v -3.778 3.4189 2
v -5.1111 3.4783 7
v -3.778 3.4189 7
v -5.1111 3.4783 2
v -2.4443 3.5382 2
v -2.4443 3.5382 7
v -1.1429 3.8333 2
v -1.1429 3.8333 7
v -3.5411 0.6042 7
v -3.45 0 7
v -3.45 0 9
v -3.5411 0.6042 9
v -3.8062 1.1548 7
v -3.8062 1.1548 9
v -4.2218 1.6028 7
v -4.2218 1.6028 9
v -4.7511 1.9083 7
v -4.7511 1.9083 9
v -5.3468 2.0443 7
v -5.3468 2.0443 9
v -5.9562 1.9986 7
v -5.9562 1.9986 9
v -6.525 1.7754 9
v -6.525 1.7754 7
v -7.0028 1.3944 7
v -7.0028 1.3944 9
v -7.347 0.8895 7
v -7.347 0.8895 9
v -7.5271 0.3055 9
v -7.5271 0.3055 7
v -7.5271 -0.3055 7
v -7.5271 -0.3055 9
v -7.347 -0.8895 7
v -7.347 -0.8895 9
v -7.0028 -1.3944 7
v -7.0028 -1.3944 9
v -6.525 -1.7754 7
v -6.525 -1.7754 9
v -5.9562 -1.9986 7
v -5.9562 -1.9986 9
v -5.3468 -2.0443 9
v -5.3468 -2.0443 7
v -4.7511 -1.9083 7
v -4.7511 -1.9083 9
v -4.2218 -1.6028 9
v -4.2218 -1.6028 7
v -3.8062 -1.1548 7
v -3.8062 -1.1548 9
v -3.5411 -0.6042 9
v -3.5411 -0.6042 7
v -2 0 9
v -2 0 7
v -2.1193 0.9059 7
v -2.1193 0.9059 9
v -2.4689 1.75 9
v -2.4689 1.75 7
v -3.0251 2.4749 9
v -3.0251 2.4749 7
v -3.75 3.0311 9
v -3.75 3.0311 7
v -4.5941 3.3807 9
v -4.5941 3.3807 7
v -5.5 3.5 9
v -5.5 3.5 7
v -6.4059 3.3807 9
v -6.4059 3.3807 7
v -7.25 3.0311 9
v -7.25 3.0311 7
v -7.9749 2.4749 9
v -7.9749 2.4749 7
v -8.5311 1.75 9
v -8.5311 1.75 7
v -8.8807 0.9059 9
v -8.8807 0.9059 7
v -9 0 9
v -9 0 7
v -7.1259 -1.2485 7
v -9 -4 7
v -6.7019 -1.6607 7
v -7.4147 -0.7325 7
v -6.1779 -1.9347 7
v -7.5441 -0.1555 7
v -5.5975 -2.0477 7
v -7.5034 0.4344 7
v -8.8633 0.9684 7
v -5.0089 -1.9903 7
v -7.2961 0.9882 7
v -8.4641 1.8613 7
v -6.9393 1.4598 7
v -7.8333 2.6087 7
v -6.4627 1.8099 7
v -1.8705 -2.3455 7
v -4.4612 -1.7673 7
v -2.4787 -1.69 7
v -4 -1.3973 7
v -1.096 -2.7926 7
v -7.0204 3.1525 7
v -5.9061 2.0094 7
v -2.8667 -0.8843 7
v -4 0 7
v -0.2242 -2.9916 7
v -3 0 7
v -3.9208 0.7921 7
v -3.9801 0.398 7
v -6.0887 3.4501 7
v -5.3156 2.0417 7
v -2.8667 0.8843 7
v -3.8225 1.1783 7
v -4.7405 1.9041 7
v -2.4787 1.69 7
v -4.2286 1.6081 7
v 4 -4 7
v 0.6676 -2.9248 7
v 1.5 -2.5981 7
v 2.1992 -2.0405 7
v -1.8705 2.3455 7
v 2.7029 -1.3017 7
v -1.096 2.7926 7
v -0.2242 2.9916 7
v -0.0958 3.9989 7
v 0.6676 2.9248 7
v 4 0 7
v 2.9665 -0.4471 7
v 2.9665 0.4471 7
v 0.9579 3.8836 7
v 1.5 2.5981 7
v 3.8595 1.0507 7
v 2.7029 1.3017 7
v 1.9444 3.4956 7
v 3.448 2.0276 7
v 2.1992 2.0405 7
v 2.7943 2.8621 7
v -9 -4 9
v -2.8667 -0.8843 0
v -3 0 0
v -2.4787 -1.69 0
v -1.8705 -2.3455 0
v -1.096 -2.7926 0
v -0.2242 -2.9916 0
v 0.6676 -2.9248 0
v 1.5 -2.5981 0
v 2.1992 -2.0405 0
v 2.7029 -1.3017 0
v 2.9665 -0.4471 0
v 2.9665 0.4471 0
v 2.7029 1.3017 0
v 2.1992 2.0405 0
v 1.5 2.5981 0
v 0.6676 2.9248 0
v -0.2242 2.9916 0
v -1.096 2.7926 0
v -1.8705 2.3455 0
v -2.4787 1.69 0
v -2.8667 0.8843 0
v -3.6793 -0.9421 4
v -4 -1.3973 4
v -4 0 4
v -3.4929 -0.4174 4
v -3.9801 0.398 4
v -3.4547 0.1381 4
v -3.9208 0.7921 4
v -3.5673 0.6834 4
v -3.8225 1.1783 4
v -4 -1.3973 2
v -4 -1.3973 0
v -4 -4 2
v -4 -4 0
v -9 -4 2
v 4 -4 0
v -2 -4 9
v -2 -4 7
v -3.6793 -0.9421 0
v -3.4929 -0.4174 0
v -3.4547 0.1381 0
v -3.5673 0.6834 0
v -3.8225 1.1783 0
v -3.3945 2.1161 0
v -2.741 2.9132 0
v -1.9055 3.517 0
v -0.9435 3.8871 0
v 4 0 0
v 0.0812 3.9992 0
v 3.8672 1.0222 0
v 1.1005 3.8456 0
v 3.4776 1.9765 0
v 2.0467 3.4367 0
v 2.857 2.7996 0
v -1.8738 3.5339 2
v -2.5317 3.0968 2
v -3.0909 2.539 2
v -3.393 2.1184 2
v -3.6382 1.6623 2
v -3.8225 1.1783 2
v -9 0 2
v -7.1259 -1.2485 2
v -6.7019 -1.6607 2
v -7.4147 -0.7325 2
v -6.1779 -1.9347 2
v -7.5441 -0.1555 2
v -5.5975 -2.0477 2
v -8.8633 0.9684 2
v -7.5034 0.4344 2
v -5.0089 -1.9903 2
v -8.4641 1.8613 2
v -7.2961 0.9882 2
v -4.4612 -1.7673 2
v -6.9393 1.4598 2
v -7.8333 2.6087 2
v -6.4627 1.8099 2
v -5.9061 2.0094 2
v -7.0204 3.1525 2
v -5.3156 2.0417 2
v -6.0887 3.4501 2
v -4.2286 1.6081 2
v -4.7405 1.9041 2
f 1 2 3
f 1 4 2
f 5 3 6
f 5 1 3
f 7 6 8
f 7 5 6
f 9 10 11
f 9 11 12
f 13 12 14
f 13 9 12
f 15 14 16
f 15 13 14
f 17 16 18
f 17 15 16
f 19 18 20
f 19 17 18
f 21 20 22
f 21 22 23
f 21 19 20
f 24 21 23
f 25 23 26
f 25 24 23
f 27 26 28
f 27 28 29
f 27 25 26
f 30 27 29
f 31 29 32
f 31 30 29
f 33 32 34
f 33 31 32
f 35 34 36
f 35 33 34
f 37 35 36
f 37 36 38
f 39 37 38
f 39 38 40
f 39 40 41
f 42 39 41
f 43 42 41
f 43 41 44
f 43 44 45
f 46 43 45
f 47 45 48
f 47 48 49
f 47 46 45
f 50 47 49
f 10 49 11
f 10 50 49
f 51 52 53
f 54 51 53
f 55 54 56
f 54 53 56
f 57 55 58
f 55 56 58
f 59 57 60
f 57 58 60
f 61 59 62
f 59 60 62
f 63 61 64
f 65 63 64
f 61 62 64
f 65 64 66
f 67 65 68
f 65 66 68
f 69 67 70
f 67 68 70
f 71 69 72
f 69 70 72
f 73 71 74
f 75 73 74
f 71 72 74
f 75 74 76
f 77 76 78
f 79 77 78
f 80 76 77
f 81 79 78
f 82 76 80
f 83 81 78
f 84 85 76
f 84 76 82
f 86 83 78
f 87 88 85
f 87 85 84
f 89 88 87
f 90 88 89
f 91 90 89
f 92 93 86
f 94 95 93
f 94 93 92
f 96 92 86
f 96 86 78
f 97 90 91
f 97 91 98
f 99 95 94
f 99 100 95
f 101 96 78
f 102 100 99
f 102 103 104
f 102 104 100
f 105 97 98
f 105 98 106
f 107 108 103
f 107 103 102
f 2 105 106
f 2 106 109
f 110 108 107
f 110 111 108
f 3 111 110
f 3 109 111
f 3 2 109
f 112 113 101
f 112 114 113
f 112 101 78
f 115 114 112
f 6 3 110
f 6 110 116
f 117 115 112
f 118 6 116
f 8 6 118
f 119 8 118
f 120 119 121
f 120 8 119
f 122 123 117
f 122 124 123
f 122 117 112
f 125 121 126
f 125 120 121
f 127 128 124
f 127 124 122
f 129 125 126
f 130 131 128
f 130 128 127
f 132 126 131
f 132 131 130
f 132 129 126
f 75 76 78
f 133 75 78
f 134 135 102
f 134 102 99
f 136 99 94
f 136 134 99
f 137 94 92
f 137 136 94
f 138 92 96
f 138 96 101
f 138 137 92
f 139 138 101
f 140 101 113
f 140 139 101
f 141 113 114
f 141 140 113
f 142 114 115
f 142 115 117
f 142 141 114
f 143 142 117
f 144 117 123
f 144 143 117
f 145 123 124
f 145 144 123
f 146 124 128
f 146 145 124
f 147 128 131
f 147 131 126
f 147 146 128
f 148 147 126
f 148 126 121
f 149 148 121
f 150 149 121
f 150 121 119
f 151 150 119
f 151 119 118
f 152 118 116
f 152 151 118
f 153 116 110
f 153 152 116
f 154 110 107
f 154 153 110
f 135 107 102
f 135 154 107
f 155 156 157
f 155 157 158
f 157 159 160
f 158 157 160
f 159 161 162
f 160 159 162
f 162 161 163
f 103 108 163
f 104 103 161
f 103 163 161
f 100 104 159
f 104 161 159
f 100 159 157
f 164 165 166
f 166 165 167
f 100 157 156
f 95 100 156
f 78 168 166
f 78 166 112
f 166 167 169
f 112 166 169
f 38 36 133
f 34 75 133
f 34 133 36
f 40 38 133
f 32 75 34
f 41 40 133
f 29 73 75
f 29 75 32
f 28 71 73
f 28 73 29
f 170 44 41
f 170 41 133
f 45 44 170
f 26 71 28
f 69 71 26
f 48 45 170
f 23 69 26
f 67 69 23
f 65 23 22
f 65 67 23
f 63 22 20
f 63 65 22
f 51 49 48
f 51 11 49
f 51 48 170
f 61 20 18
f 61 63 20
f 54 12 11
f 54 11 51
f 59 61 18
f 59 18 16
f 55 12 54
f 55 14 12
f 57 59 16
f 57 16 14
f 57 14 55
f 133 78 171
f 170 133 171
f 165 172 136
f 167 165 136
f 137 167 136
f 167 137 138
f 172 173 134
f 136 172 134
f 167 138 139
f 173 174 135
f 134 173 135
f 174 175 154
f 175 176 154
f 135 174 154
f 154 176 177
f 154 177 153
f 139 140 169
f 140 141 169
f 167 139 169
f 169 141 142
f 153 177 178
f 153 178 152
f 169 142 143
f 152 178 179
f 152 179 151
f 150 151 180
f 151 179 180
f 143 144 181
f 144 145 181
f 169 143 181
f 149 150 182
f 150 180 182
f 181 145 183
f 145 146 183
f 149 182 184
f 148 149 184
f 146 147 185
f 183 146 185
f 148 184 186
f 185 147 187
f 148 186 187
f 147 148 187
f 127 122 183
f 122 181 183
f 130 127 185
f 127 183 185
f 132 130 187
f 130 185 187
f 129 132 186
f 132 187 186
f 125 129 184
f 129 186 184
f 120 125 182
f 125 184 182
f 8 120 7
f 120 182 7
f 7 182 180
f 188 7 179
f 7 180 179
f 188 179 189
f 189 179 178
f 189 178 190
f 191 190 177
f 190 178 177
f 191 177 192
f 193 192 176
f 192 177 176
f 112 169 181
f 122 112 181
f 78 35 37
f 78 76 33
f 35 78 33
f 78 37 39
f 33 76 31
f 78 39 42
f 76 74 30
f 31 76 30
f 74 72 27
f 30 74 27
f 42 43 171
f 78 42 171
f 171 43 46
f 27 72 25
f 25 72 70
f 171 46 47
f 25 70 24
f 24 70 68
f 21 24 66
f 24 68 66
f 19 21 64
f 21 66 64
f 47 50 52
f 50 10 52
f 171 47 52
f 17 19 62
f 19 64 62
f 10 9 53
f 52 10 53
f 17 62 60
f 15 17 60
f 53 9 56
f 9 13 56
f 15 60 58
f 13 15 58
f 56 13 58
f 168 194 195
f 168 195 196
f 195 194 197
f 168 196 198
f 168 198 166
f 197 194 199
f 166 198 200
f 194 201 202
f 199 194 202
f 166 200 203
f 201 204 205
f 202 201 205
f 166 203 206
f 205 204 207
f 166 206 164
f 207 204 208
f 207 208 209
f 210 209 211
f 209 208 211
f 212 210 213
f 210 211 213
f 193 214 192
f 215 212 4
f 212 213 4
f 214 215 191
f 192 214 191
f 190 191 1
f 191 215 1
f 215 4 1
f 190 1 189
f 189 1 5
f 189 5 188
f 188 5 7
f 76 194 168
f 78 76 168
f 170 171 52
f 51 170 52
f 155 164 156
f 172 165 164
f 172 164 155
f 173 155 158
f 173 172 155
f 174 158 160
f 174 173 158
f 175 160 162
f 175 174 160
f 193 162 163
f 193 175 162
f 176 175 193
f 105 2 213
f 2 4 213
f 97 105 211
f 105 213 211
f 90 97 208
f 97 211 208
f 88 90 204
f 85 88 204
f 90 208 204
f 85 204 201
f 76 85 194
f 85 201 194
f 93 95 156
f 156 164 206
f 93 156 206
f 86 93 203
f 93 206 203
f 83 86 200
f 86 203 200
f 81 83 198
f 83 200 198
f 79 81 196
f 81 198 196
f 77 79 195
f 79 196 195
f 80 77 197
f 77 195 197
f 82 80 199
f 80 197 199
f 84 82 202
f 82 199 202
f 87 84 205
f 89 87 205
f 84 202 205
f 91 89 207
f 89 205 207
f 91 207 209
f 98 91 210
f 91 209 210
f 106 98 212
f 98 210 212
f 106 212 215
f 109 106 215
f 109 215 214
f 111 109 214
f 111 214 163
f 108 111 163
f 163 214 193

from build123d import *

# Parameters (mm, degrees)
SKETCH1_R           = 3
BOSS_EXTRUDE1_DEPTH = 7
BOSS_EXTRUDE6_START = -3
BOSS_EXTRUDE6_DEPTH = 3
SKETCH2_4_R         = 2.05
BOSS_EXTRUDE8_DEPTH = 2
BOSS_EXTRUDE9_START = -5
BOSS_EXTRUDE9_DEPTH = 2
FILLET2_R           = 10
CUT_EXTRUDE5_START  = -10
SKETCH2_9_R         = 2.05
CUT_EXTRUDE5_DEPTH  = 7


with BuildPart() as part:
    # Sketch1 → Boss-Extrude1 (new body)
    with BuildSketch(Plane.XY):
        with BuildLine():
            Line((-4, 0), (-4, -4))
            Line((-4, -4), (4, -4))
            Line((4, -4), (4, 0))
            ThreePointArc((4, 0), (0, 4), (-4, 0))
        make_face()
        with Locations(Location((0, 0, 0), (0, 0, 180))):
            Circle(SKETCH1_R, mode=Mode.SUBTRACT)
    extrude(amount=BOSS_EXTRUDE1_DEPTH)

    # Sketch2 → Boss-Extrude6 (add)
    with BuildSketch(Plane.XY.offset(7).offset(BOSS_EXTRUDE6_START)):
        with BuildLine():
            ThreePointArc((-3.090909091, 2.538952735), (-6.881698559, 3.215728392), (-9, 0))
            Line((-9, 0), (-9, -4))
            Line((-9, -4), (-4, -4))
            Line((-4, -4), (-4, -1.397318861))
            ThreePointArc((-4, -1.397318861), (-7.545149359, 0.140940053), (-3.8225, 1.178343647))
            ThreePointArc((-3.8225, 1.178343647), (-3.523012998, 1.894301827), (-3.090909091, 2.538952735))
        make_face()
    extrude(amount=BOSS_EXTRUDE6_DEPTH)

    # Sketch2<6> → Boss-Extrude9 (add)
    with BuildSketch(Plane.XY.offset(7).offset(BOSS_EXTRUDE9_START)):
        with BuildLine():
            ThreePointArc((-3.090909091, 2.538952735), (-6.881698559, 3.215728392), (-9, 0))
            Line((-9, 0), (-9, -4))
            Line((-9, -4), (-4, -4))
            Line((-4, -4), (-4, -1.397318861))
            ThreePointArc((-4, -1.397318861), (-7.545149359, 0.140940053), (-3.8225, 1.178343647))
            ThreePointArc((-3.8225, 1.178343647), (-3.523012998, 1.894301827), (-3.090909091, 2.538952735))
        make_face()
    extrude(amount=BOSS_EXTRUDE9_DEPTH)

    # Fillet2
    fillet2_edges = [part.edges().sort_by_distance(p)[0] for p in [
        (-3.090909091, 2.538952735, 4.5),
    ]]
    fillet(fillet2_edges, radius=FILLET2_R)

    # Sketch2<9> → Cut-Extrude5 (cut)
    with BuildSketch(Plane.XY.offset(7).offset(CUT_EXTRUDE5_START)):
        with Locations((-5.5, 0)):
            Circle(SKETCH2_9_R)
    extrude(amount=CUT_EXTRUDE5_DEPTH, mode=Mode.SUBTRACT)


with BuildPart() as body_2:
    # Sketch2<4> → Boss-Extrude8 (new body)
    with BuildSketch(Plane.XY.offset(7)):
        with BuildLine():
            Line((-9, 0), (-9, -4))
            Line((-9, -4), (-2, -4))
            Line((-2, -4), (-2, 0))
            ThreePointArc((-2, 0), (-5.5, 3.5), (-9, 0))
        make_face()
        with Locations((-5.5, 0)):
            Circle(SKETCH2_4_R, mode=Mode.SUBTRACT)
    extrude(amount=BOSS_EXTRUDE8_DEPTH)


solid = Compound([part.part, body_2.part])
